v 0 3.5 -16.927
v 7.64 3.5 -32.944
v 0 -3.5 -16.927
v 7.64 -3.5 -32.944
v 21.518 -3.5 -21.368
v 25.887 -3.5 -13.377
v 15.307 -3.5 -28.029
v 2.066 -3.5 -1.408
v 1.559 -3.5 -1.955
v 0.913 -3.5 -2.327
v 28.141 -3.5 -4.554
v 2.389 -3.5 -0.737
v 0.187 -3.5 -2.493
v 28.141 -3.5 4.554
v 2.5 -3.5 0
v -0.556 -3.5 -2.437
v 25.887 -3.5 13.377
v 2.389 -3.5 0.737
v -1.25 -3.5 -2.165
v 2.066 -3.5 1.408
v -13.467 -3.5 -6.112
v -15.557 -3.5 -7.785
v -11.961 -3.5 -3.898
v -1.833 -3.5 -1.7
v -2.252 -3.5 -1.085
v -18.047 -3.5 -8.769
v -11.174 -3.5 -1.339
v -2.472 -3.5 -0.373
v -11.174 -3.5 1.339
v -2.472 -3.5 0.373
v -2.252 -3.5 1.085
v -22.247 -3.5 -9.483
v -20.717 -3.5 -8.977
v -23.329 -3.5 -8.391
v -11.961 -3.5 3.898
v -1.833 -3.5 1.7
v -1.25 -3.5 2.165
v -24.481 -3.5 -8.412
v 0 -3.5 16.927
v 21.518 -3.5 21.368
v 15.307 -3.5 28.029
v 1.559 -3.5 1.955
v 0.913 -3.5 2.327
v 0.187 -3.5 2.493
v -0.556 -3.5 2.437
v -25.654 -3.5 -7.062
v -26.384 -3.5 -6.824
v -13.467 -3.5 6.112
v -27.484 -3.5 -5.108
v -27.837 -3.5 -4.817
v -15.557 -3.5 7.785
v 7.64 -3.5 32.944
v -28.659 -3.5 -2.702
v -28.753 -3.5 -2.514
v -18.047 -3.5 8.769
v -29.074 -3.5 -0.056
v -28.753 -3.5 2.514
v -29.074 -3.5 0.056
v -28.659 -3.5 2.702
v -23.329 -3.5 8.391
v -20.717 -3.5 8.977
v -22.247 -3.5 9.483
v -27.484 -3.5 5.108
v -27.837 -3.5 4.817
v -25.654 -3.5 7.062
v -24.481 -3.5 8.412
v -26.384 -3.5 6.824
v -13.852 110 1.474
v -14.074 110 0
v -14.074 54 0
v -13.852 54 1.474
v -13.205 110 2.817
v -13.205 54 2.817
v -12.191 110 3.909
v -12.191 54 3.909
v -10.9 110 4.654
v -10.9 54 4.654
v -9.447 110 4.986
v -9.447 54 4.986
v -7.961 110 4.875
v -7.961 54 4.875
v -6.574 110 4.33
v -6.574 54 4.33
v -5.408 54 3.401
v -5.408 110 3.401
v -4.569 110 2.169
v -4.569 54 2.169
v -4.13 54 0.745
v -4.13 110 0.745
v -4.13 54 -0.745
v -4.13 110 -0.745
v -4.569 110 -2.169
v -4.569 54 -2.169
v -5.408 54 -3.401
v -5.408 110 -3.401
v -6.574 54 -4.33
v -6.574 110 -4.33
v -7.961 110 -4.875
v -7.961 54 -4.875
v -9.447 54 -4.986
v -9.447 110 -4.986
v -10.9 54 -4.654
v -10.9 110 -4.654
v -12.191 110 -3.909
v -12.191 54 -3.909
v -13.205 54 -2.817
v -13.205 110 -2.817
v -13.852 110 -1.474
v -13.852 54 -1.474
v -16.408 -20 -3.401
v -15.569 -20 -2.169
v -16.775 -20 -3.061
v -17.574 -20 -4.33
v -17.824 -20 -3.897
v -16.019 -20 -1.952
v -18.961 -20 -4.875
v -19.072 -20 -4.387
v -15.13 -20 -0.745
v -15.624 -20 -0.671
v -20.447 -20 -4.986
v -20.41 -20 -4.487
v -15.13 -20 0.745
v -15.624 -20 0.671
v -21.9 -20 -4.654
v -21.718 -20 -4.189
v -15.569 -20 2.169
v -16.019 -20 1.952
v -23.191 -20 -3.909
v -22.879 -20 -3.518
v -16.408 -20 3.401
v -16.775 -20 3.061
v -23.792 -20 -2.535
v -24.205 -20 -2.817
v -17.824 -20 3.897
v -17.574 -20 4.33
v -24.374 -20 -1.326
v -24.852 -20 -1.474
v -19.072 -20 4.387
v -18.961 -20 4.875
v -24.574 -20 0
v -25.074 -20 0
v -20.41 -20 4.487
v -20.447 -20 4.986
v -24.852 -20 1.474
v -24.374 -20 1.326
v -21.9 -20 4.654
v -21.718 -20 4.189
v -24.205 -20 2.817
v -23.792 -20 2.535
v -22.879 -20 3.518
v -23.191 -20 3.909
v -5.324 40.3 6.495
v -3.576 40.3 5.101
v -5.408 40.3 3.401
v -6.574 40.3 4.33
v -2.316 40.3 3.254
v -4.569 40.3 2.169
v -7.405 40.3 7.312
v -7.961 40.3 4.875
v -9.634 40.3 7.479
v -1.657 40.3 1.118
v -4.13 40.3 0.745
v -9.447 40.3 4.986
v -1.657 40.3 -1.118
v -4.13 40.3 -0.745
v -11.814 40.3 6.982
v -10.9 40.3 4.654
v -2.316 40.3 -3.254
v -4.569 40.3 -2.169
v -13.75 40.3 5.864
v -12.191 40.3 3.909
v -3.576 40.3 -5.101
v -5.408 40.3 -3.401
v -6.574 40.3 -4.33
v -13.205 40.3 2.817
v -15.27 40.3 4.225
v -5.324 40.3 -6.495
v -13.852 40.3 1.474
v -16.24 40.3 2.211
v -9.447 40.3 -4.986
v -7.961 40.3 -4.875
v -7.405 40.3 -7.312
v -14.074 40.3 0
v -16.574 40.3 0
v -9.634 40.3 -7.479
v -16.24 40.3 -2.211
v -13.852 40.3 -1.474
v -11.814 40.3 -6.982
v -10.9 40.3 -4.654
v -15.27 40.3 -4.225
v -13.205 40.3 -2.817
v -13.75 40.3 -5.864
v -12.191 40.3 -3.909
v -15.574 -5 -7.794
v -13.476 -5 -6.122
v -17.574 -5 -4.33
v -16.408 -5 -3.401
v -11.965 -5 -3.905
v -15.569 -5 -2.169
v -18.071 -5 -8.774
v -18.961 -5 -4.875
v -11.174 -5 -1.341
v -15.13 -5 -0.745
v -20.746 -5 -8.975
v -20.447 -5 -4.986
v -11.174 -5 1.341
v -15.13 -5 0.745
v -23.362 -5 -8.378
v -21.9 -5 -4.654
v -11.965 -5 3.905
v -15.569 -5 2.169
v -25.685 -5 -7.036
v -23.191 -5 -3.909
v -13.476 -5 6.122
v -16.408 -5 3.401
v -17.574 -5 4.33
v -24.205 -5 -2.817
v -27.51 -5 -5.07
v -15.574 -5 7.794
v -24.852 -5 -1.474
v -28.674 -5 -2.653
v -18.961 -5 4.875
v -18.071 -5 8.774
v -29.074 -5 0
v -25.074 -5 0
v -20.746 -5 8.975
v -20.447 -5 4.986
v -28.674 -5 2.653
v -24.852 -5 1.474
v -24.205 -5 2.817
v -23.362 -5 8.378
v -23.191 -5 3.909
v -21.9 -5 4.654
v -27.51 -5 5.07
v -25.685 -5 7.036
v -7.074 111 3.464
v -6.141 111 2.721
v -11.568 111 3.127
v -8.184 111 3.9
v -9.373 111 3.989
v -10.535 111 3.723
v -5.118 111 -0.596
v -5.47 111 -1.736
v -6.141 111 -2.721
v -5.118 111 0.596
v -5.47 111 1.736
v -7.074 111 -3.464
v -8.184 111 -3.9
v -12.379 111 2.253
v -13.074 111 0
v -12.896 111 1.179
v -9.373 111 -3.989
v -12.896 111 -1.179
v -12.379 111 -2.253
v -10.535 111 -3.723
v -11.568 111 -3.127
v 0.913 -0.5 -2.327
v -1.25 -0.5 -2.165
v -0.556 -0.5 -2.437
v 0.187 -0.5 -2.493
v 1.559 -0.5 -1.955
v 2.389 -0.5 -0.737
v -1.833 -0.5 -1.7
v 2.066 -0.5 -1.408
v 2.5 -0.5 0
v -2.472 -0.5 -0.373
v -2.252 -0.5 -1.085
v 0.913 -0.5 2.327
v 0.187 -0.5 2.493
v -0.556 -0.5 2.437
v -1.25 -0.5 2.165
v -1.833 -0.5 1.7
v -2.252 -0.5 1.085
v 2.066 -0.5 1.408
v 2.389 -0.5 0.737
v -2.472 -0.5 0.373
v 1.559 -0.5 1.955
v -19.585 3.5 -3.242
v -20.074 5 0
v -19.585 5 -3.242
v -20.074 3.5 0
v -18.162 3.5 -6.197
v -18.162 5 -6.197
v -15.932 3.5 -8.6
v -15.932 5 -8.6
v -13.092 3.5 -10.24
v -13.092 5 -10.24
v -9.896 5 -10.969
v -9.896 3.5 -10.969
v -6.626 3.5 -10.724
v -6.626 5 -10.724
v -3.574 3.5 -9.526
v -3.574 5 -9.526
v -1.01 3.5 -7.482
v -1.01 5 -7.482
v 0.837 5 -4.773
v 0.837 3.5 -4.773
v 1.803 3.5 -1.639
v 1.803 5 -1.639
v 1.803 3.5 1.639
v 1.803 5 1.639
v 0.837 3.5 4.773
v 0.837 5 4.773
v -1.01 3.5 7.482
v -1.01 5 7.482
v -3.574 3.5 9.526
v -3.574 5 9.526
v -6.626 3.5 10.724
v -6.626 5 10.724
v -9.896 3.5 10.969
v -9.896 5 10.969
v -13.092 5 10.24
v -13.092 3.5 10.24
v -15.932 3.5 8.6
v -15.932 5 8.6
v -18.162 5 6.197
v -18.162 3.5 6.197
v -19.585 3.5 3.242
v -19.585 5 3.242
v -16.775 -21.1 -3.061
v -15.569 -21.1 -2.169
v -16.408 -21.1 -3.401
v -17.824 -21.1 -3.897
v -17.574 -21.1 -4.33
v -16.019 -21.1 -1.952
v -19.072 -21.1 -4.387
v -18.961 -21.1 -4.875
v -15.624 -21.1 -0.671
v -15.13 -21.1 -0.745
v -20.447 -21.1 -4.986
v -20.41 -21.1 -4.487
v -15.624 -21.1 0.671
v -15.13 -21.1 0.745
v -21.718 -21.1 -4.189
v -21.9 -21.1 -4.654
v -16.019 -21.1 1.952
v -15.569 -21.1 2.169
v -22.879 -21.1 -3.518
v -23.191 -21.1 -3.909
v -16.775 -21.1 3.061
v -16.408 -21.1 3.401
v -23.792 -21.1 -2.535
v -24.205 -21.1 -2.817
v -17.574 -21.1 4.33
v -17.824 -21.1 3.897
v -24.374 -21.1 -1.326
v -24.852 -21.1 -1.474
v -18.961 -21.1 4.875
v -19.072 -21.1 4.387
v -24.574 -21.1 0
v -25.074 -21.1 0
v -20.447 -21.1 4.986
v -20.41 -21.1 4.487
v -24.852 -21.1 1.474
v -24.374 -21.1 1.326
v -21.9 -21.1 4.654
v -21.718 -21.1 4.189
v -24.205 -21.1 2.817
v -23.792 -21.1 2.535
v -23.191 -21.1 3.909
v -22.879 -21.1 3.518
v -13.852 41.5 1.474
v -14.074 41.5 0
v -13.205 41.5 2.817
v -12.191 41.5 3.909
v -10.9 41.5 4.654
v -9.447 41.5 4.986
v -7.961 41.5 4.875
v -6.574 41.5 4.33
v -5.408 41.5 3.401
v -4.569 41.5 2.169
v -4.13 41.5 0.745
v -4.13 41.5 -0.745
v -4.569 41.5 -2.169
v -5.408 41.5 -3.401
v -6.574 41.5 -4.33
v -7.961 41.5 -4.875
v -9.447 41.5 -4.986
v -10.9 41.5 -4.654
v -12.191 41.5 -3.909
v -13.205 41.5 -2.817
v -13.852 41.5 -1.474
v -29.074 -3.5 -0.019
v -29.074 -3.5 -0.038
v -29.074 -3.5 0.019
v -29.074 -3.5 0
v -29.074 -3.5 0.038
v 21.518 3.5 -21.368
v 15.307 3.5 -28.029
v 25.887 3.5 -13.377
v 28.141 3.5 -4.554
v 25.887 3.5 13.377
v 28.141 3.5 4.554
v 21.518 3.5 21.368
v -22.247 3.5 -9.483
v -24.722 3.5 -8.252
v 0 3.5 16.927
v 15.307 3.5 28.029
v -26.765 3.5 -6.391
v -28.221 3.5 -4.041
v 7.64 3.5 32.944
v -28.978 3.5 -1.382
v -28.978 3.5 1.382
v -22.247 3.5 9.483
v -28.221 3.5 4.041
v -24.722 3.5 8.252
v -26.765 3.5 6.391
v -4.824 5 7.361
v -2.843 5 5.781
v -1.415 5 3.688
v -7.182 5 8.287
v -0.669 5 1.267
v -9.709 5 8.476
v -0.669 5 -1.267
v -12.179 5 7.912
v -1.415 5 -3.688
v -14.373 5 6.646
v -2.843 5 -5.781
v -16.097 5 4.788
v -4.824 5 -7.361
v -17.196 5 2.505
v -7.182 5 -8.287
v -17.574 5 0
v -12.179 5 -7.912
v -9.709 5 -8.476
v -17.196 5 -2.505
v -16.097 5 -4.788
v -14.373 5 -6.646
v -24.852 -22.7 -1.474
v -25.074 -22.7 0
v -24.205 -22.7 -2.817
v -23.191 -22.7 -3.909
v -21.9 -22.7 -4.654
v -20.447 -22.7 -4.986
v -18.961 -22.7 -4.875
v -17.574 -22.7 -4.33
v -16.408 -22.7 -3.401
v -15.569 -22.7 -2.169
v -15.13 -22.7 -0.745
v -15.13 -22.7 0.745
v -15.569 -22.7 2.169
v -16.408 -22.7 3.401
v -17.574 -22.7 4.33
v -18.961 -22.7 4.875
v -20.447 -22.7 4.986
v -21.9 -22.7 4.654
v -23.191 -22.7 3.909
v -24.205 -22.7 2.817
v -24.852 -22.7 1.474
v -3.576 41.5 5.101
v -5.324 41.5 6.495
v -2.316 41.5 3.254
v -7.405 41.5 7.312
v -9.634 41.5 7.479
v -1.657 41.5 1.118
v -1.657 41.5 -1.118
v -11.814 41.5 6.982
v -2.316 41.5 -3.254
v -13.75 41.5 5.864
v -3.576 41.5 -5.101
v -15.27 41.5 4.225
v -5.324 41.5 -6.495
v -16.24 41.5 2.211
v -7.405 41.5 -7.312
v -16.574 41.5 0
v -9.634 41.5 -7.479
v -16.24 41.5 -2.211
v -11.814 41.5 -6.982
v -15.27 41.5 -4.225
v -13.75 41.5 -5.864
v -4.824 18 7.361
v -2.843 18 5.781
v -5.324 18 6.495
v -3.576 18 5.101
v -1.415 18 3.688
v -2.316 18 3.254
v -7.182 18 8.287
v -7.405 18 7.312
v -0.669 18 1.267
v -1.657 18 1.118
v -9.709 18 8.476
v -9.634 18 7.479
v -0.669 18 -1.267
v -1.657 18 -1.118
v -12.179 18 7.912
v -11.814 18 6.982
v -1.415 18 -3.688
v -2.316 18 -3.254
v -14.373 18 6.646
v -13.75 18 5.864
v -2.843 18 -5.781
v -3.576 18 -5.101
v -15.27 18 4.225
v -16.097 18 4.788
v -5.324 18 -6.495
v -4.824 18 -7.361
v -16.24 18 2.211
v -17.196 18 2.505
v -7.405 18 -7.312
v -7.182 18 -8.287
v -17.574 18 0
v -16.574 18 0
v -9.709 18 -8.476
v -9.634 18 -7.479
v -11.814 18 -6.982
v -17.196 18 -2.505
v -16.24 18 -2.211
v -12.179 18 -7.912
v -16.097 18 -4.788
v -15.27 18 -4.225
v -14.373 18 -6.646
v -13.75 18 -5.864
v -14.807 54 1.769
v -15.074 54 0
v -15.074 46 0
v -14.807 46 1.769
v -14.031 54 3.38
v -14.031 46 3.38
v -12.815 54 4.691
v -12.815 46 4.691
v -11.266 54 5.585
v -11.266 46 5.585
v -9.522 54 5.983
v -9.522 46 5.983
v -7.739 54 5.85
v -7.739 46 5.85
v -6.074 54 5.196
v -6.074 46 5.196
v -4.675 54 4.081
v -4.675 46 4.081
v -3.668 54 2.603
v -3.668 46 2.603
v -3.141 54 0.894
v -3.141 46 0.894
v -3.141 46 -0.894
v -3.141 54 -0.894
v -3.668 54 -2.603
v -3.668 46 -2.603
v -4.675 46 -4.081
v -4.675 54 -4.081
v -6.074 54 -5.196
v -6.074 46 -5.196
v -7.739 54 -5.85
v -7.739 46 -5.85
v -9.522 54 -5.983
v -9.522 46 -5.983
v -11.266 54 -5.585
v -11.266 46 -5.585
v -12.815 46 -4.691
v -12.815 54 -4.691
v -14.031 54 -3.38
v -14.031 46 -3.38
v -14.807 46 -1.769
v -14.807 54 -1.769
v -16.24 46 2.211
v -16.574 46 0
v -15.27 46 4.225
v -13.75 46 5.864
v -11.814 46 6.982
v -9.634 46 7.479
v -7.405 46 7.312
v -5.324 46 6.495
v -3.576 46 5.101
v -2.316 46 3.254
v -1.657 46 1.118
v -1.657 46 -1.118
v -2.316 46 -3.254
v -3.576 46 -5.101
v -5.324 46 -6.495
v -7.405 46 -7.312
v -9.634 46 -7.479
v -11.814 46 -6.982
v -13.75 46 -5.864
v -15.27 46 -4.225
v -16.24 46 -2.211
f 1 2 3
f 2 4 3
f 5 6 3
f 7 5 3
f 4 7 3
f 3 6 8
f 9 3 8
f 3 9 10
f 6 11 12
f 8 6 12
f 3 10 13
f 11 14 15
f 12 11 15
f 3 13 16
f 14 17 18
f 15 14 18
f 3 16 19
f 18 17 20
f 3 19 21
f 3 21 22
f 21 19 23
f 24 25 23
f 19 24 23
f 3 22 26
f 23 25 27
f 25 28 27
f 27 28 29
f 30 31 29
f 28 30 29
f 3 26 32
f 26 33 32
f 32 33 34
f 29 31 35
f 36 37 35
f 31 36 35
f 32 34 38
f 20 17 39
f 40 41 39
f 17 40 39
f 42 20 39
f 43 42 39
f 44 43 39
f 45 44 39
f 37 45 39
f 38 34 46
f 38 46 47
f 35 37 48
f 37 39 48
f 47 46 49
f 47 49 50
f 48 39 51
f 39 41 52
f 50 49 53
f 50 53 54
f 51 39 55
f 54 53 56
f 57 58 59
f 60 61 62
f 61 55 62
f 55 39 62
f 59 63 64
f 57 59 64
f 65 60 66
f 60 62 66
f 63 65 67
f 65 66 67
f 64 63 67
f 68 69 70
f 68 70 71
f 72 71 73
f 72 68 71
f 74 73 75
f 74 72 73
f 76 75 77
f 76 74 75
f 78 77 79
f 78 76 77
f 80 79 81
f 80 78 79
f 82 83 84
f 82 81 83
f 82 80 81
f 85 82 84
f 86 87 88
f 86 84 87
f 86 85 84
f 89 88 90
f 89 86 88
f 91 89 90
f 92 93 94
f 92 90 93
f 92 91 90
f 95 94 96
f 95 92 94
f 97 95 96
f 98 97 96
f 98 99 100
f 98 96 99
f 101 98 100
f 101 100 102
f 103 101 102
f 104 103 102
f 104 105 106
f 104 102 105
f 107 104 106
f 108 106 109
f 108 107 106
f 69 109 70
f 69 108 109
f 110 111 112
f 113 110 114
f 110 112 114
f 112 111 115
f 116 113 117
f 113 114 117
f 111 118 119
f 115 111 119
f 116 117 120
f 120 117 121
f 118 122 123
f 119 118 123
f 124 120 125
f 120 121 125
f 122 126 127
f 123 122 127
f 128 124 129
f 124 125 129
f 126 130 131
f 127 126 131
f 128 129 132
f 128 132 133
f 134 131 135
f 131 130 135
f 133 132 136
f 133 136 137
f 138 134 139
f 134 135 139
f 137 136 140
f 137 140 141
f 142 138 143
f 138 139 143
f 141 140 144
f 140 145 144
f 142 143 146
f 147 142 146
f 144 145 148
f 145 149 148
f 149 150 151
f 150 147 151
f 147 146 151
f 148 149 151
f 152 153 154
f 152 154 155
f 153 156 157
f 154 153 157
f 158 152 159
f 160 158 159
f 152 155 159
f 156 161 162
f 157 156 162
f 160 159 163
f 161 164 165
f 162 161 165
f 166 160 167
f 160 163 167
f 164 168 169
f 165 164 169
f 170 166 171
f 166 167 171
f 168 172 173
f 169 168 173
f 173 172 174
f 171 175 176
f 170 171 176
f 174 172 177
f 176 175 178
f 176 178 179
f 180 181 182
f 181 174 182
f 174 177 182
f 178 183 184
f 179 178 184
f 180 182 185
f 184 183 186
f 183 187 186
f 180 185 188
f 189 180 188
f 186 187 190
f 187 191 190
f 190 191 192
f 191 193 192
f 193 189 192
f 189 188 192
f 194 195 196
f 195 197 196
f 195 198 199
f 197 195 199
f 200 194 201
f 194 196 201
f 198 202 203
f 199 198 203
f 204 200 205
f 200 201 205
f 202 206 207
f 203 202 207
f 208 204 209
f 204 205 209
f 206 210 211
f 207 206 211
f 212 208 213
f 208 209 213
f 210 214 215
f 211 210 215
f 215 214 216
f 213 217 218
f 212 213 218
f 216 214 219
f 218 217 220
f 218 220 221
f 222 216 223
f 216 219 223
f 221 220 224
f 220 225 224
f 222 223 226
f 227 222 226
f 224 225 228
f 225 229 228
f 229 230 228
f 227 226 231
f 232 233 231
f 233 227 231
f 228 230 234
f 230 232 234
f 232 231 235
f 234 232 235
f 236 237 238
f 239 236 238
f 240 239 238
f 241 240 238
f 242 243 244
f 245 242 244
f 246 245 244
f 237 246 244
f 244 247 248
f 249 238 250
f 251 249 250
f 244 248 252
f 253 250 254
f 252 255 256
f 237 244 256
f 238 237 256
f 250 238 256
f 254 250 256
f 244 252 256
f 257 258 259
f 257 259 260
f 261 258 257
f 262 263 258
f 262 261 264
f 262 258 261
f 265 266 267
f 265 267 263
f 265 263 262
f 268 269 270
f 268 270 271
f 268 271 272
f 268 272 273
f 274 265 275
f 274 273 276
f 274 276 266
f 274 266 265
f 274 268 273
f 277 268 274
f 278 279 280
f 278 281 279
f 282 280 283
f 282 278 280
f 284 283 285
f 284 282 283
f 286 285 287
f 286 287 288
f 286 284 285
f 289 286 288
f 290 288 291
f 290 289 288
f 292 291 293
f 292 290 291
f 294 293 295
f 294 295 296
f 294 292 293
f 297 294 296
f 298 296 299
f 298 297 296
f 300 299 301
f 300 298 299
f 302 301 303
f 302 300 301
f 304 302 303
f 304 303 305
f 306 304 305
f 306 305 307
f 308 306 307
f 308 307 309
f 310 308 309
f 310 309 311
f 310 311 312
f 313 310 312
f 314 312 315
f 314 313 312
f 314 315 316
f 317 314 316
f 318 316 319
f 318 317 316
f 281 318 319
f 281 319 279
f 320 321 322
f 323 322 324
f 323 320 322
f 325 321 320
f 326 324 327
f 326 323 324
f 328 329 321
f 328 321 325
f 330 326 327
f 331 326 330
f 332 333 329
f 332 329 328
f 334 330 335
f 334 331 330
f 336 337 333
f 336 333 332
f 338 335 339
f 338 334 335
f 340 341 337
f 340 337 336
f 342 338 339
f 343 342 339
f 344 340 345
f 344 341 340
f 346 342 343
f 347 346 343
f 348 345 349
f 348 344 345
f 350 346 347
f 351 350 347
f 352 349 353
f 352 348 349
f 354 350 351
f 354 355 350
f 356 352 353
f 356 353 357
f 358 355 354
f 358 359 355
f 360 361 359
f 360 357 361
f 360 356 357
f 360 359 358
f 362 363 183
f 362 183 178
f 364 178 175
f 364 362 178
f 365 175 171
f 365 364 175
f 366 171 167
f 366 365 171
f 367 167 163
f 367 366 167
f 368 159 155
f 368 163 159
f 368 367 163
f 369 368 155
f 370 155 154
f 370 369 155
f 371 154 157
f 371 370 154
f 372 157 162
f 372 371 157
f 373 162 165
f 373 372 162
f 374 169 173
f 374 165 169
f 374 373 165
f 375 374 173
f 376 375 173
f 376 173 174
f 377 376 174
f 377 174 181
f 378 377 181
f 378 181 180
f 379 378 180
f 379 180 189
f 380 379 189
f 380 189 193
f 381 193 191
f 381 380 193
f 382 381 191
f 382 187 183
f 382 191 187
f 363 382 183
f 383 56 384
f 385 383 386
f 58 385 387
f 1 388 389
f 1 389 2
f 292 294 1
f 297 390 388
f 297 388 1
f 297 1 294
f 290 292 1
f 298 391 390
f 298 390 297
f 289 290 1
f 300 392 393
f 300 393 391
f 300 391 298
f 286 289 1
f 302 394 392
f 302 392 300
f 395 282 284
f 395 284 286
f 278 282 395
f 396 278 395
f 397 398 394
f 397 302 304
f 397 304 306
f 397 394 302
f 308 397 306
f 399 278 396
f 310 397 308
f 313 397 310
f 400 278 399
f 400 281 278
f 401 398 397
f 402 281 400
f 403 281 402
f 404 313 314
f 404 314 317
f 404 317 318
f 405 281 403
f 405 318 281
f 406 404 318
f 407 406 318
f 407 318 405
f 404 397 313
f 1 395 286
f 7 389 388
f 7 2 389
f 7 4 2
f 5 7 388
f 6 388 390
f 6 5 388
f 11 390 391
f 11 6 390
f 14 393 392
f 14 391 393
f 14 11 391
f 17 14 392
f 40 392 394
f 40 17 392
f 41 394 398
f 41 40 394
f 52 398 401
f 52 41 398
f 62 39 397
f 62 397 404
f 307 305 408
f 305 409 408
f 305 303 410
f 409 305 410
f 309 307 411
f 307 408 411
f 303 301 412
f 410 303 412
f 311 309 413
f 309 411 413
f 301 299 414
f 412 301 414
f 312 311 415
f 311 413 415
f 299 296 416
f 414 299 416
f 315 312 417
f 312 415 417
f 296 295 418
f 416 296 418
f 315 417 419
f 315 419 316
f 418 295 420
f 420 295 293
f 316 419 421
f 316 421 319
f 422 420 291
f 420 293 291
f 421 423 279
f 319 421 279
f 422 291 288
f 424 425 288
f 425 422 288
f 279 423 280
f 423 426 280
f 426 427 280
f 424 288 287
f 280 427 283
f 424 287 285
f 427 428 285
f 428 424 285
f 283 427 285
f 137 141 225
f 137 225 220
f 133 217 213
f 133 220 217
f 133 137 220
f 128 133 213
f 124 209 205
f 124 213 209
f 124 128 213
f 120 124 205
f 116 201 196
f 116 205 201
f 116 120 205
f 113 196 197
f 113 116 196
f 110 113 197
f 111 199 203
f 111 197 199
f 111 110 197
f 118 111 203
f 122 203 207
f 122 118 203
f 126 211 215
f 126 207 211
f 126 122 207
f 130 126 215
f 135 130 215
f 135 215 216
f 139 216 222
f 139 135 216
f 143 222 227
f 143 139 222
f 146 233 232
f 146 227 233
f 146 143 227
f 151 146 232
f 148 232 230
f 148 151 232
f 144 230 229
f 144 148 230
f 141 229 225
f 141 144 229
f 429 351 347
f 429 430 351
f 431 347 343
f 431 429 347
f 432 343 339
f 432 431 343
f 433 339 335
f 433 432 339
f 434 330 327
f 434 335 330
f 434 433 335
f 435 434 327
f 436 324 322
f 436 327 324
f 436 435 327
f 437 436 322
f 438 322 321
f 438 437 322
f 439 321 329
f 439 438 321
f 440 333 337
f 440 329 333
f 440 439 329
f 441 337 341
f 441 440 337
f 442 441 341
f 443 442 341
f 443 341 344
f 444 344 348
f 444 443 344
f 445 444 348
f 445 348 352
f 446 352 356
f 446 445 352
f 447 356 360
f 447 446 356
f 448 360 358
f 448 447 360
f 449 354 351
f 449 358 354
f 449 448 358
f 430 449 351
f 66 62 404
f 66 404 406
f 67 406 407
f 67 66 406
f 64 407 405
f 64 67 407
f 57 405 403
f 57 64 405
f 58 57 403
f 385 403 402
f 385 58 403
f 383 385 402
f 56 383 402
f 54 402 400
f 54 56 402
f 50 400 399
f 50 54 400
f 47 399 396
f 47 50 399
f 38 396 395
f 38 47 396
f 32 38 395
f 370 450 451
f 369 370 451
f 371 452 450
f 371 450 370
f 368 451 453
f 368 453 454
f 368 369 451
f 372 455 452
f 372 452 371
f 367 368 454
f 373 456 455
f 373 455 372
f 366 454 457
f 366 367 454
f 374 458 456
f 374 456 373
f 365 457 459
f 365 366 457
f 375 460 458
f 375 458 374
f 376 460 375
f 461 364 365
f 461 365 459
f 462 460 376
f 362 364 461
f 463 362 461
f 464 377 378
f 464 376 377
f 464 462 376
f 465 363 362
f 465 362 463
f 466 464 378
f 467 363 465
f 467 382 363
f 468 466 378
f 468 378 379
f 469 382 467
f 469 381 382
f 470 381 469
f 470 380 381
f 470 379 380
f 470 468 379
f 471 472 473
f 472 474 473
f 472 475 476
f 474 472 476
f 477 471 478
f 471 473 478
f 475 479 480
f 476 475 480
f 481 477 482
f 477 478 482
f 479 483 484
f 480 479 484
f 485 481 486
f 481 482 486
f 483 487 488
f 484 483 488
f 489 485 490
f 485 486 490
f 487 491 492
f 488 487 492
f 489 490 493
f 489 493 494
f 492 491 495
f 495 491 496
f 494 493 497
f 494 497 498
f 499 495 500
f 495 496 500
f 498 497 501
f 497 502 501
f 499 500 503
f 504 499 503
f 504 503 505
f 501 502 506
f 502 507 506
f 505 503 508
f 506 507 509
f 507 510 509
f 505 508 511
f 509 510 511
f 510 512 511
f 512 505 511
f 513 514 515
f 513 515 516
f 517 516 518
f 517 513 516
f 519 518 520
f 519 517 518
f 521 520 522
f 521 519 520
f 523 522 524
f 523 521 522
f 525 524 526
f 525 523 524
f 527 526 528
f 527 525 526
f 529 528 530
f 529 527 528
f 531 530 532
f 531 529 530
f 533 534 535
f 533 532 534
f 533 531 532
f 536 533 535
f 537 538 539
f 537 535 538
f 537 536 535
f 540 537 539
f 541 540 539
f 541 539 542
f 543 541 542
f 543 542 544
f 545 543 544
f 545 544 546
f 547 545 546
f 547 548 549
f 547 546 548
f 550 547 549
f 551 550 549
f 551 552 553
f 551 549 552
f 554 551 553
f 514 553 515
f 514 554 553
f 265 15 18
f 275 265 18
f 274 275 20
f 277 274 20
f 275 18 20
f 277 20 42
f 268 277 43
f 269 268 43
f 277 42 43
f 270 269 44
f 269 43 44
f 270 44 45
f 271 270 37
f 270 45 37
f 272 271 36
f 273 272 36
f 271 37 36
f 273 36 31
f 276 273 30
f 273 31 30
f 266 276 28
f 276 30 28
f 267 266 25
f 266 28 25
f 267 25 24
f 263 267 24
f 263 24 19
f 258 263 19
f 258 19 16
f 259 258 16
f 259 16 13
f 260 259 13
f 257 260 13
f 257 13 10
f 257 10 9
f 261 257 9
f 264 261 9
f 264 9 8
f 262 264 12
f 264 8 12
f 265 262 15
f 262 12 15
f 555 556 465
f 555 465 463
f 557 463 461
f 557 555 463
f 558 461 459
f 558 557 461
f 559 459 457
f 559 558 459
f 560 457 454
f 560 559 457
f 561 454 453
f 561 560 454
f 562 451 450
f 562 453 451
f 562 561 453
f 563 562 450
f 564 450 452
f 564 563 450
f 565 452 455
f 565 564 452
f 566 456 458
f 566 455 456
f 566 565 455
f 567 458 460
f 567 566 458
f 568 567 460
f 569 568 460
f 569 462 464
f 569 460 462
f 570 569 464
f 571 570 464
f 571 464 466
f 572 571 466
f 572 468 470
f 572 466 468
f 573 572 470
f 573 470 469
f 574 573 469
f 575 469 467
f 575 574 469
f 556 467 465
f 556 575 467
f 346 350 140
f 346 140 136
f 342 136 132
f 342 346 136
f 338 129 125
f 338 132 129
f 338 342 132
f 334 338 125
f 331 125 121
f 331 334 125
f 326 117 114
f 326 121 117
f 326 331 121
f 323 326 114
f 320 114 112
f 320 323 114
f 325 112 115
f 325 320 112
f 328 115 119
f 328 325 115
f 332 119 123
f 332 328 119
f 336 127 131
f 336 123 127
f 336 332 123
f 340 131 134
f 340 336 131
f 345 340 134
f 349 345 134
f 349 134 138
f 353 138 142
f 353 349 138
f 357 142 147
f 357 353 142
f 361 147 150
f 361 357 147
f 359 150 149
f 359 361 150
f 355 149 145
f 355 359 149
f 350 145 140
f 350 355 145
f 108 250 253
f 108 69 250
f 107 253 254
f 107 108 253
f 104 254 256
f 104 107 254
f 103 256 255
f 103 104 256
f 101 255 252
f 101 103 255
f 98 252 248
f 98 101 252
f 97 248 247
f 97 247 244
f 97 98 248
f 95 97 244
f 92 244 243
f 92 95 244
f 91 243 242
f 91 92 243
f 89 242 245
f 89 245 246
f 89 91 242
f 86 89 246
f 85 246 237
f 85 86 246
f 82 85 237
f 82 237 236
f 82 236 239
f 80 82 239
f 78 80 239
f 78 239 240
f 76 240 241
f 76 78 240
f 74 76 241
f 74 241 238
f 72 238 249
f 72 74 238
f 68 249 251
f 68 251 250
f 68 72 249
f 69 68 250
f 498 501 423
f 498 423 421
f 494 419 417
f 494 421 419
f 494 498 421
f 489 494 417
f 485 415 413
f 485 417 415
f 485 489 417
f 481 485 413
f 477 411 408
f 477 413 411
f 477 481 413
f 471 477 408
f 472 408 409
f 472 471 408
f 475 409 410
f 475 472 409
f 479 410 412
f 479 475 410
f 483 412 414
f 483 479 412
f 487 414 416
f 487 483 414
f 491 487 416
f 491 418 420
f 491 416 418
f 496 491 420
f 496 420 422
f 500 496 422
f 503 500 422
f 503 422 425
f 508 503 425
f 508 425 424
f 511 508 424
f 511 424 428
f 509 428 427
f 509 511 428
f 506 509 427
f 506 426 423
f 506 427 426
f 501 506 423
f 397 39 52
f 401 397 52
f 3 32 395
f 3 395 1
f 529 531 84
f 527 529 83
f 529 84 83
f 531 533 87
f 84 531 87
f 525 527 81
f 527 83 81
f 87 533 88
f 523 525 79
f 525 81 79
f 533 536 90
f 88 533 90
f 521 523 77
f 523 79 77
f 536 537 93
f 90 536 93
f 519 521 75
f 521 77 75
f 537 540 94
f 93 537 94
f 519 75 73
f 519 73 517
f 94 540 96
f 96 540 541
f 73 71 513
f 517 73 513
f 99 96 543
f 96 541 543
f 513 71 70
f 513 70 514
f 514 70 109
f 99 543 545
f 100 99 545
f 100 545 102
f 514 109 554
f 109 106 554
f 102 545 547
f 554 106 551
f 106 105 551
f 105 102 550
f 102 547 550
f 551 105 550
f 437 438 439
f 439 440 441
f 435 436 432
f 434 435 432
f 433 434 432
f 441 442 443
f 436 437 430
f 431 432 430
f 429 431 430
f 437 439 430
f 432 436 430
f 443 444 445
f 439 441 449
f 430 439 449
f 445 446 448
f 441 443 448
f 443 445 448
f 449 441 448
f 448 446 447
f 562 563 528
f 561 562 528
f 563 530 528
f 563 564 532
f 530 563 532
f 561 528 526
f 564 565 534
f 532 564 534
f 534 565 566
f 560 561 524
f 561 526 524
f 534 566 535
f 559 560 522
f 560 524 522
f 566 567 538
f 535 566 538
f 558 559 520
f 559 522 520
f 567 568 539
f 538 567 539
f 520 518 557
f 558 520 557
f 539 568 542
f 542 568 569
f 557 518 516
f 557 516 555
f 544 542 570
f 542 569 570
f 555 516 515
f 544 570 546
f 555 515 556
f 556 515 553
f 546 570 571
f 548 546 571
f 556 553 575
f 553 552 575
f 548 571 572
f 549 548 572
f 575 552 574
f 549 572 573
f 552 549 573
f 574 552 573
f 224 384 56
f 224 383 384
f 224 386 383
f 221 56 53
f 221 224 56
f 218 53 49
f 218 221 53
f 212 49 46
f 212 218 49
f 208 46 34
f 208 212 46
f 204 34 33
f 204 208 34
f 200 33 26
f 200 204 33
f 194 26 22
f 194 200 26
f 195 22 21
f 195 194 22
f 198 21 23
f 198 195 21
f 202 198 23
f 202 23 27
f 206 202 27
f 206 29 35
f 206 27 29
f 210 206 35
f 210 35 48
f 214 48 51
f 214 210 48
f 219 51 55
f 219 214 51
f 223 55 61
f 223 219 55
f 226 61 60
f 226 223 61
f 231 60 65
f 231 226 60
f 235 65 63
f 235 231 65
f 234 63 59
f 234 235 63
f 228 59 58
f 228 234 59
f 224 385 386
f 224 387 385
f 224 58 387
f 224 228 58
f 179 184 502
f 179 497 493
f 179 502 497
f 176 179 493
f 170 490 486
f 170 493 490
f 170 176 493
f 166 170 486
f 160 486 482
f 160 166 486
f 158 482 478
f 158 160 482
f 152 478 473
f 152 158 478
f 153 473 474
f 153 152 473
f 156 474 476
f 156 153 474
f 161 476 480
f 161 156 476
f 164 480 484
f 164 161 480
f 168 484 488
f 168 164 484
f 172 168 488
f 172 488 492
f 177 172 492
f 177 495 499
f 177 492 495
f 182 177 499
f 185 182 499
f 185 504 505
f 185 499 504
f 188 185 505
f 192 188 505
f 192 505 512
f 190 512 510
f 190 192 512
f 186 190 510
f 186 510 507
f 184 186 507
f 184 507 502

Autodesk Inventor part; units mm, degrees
ref_plane "YZ Plane" through (0, 0, 0) normal (1, 0, 0) x (0, 1, 0)
sketch "Skizze1" plane through (0, 0, 0) normal (0, 1, 0) x (-1, 0, 0)
  line L0 (0, 16.9269) -> (22.2468, 9.4832)
  arc A0 (22.2468, -9.4832) -> (22.2468, 9.4832) centre (19.0737, 0) ccw
  line L1 (22.2468, -9.4832) -> (0, -16.9269)
  line L2 (0, 0) -> (24.8397, 0) construction
  line L3 (0, 16.9269) -> (-7.6399, 32.9444)
  arc A1 (-7.6399, 32.9444) -> (-7.6399, -32.9444) centre (8.0737, 0) ccw
  line L4 (-7.6399, -32.9444) -> (0, -16.9269)
  dimension "d0" = 37
  dimension "d2" = 129
  dimension "d3" = 36.5
  dimension "d5" = 10
  dimension "d53" = 11
extrude "Extrusion1" add sketch "Skizze1" along normal mid plane 7
ref_plane "Arbeitsebene1" through (0, 0, 0) normal (0, 0, 1) x (1, 0, 0)
sketch "Skizze5" plane through (0, 0, 0) normal (0, 0, 1) x (1, 0, 0)
  line L0 (-22.2468, -3.5) -> (0, -3.5) projected
  line L1 (-29.0737, -3.5) -> (-22.2468, -3.5) projected
  line L2 (-29.0737, -3.5) -> (-29.0737, 3.5) projected
  line L3 (-29.0737, -3.5) -> (-29.0737, -5)
  line L4 (-29.0737, -5) -> (-25.0737, -5)
  line L5 (-25.0737, -5) -> (-25.0737, -20)
  line L6 (-25.0737, -20) -> (-24.5737, -20)
  line L7 (-24.5737, -20) -> (-24.5737, -21.1)
  line L8 (-24.5737, -21.1) -> (-25.0737, -21.1)
  line L9 (-25.0737, -21.1) -> (-25.0737, -22.7)
  line L10 (-25.0737, -22.7) -> (-20.0737, -22.7)
  line L11 (-20.0737, -22.7) -> (-20.0737, -3.5)
  point P0 (0, 0)
  point P1 (-24.8237, -20)
  dimension "d32" = 9
  dimension "d33" = 1.5
  dimension "d35" = 1.1
  dimension "d36" = 15
  dimension "d37" = 10
  dimension "d38" = 9
  dimension "d39" = 18
  dimension "d41" = 2.7
revolve "Umdrehung2" add sketch "Skizze5" angle 360 about axis through (-20.0737, -22.7, 0) along (0, 1, 0)
sketch "Skizze3" plane through (0, 0, 0) normal (0, 0, 1) x (1, 0, 0)
  line L0 (0, 3.5) -> (-22.2468, 3.5) projected
  line L1 (-22.2468, 3.5) -> (-29.0737, 3.5) projected
  line L2 (-29.0737, -3.5) -> (-29.0737, 3.5) projected
  line L3 (-20.0737, 5) -> (-17.5737, 5)
  line L4 (-17.5737, 5) -> (-17.5737, 18)
  line L5 (-17.5737, 18) -> (-16.5737, 18)
  line L6 (-16.5737, 18) -> (-16.5737, 40.3)
  line L7 (-16.5737, 40.3) -> (-14.0737, 40.3)
  line L8 (-14.0737, 40.3) -> (-14.0737, 41.5)
  line L9 (-14.0737, 41.5) -> (-16.5737, 41.5)
  line L10 (-16.5737, 41.5) -> (-16.5737, 46)
  line L11 (-16.5737, 46) -> (-15.0737, 46)
  line L12 (-15.0737, 46) -> (-15.0737, 54)
  line L13 (-15.0737, 54) -> (-14.0737, 54)
  line L14 (-14.0737, 54) -> (-14.0737, 111)
  line L15 (-14.0737, 111) -> (-9.0737, 111)
  line L16 (-9.0737, 111) -> (-9.0737, 3.5)
  line L17 (-20.0737, 5) -> (-20.0737, 3.5)
  line L18 (-11.0737, -5) -> (-29.0737, -5) construction
  line L19 (-11.0737, -5) -> (-11.0737, -3.5) construction
  line L20 (-29.0737, -5) -> (-29.0737, -3.5) construction
  line L21 (-25.0737, -20) -> (-25.0737, -5) construction
  line L22 (-15.0737, -20) -> (-15.0737, -5) construction
  line L23 (-15.0737, -22.7) -> (-25.0737, -22.7) construction
  point P0 (-15.8237, 46)
  point P1 (-9.0737, 3.5)
  point P2 (-20.0737, -5)
  dimension "d13" = 10
  dimension "d14" = 12
  dimension "d15" = 15
  dimension "d16" = 17
  dimension "d18" = 22
  dimension "d20" = 1.5
  dimension "d21" = 1.2
  dimension "d22" = 4.5
  dimension "d44" = 13
  dimension "d45" = 8
  dimension "d46" = 57
  dimension "d47" = 28
  dimension "d48" = 106
revolve "Umdrehung1" add sketch "Skizze3" angle 360 about axis through (-9.0737, 111, 0) along (0, -1, 0)
thread "Gewinde1" size "M10x1.5" class "6g" standard "ISO Metric profile" length 28
chamfer "Fasen1" distance 1 angle 45 1 edges at (-4.0737, 111, 0)
ref_plane "Work Plane3" through (0, 0, 8.5) normal (0, 0, 1) x (1, 0, 0)
sketch "Sketch8" plane through (-8.0737, -3.5, 0) normal (0, -1, 0) x (1, 0, 0)
  circle A0 centre (8.0737, 0) radius 2.5
  dimension "d54" = 5
extrude "Extrusion2" cut sketch "Sketch8" against normal blind 3
properties part number "Welle" material "Stahl, galvanisiert"
